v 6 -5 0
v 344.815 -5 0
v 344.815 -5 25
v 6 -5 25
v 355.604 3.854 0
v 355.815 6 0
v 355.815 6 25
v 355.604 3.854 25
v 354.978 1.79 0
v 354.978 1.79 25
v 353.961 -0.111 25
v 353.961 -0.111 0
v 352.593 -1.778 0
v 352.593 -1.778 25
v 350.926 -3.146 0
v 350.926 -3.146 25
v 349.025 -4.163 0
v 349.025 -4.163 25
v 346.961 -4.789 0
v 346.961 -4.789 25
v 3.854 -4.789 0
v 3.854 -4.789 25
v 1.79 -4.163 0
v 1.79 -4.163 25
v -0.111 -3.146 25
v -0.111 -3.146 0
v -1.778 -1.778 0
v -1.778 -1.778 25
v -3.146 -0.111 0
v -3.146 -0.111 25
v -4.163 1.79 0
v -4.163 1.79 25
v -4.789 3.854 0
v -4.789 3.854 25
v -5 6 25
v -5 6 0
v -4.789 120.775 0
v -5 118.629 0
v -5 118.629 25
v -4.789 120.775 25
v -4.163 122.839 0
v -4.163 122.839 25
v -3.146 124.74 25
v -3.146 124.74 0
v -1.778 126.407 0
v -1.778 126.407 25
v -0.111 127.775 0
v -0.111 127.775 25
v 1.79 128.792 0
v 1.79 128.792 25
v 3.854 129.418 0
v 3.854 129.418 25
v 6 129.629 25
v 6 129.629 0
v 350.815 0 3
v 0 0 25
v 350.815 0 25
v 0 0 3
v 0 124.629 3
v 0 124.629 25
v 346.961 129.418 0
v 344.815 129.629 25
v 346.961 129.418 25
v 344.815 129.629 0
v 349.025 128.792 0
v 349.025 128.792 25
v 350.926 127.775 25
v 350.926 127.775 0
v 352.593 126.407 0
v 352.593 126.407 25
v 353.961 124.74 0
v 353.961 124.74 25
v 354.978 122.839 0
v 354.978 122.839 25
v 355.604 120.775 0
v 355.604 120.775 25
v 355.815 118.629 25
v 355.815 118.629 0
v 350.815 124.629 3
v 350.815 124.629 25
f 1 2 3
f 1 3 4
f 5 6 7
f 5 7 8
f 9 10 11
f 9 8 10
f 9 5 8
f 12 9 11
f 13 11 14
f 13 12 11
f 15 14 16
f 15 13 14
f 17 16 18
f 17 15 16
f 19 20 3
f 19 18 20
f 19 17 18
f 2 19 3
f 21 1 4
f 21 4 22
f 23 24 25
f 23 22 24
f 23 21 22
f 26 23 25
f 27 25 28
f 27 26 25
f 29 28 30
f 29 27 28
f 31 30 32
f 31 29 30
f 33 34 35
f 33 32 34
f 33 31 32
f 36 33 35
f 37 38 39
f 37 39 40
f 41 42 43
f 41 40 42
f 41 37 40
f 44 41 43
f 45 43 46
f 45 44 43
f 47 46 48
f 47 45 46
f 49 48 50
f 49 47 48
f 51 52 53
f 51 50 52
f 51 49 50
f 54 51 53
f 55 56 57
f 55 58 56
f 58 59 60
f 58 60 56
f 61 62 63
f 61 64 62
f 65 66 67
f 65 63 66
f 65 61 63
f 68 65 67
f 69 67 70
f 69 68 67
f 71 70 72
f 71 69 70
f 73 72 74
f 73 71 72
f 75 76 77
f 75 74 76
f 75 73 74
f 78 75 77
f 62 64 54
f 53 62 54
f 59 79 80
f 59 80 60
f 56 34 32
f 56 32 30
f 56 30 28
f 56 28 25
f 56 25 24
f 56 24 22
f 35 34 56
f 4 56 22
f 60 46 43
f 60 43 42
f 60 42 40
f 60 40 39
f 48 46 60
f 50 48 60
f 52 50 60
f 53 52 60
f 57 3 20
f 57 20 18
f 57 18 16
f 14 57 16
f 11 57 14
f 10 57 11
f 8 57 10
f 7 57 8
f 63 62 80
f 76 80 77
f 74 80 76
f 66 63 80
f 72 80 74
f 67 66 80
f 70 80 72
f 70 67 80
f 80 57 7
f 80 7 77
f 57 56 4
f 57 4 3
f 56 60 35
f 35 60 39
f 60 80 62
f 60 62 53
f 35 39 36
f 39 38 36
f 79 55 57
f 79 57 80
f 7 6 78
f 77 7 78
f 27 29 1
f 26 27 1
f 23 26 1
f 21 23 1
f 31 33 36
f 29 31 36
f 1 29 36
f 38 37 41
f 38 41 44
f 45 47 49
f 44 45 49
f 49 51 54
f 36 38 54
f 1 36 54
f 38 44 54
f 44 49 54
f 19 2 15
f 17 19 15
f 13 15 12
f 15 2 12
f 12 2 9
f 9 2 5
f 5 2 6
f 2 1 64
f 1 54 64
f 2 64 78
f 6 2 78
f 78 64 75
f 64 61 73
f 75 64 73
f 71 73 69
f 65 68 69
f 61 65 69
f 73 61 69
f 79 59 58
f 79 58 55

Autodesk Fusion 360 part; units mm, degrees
sketch "Sketch1" plane through (0, 0, 0) normal (0, 0, 1) x (1, 0, 0)
  line L0 (0, 0) -> (350.815, 0)
  line L1 (350.815, 0) -> (350.815, 124.629)
  line L2 (0, 124.629) -> (0, 0)
  line L3 (350.815, 0) -> (350.815, 124.629)
  line L4 (344.815, 129.629) -> (0, 129.629)
  line L5 (0, 0) -> (0, 124.629)
  line L6 (0, 0) -> (350.815, 0)
  line L7 (0, 129.629) -> (344.815, 129.629)
  line L8 (350.815, 124.629) -> (0, 124.629)
  line L9 (350.815, 124.629) -> (350.815, 0)
  line L10 (355.815, 6) -> (355.815, 118.629)
  line L11 (344.815, -5) -> (6, -5)
  line L12 (-5, -5) -> (-5, 0)
  line L13 (0, 0) -> (350.815, 0)
  line L14 (0, 0) -> (0, 124.629)
  line L15 (0, 129.629) -> (6, 129.629)
  line L16 (-5, 118.629) -> (-5, 6)
  arc A0 (-5, 6) -> (6, -5) centre (6, 6) ccw
  arc A1 (6, 129.629) -> (-5, 118.629) centre (6, 118.629) ccw
  arc A2 (344.815, -5) -> (355.815, 6) centre (344.815, 6) ccw
  arc A3 (355.815, 118.629) -> (344.815, 129.629) centre (344.815, 118.629) ccw
  line L17 (6, 129.629) -> (0, 129.629)
  point P0 (355.815, 129.629)
  point P1 (355.815, -5)
  dimension "d12" = 355.815
  dimension "d13" = 5
  dimension "d16" = 11
  dimension "d17" = 11
  dimension "d18" = 11
  dimension "d19" = 11
  dimension "d24" = 360.815
  dimension "d25" = 134.629
extrude "Extrude1" add sketch "Sketch1" along normal blind 3 contours L0 L1 L2 L3 L5 L6 L8 L9 L13 L14
extrude "Extrude2" add sketch "Sketch1" along normal blind 25
equation "d12 = 350.815 mm + 5 mm"
